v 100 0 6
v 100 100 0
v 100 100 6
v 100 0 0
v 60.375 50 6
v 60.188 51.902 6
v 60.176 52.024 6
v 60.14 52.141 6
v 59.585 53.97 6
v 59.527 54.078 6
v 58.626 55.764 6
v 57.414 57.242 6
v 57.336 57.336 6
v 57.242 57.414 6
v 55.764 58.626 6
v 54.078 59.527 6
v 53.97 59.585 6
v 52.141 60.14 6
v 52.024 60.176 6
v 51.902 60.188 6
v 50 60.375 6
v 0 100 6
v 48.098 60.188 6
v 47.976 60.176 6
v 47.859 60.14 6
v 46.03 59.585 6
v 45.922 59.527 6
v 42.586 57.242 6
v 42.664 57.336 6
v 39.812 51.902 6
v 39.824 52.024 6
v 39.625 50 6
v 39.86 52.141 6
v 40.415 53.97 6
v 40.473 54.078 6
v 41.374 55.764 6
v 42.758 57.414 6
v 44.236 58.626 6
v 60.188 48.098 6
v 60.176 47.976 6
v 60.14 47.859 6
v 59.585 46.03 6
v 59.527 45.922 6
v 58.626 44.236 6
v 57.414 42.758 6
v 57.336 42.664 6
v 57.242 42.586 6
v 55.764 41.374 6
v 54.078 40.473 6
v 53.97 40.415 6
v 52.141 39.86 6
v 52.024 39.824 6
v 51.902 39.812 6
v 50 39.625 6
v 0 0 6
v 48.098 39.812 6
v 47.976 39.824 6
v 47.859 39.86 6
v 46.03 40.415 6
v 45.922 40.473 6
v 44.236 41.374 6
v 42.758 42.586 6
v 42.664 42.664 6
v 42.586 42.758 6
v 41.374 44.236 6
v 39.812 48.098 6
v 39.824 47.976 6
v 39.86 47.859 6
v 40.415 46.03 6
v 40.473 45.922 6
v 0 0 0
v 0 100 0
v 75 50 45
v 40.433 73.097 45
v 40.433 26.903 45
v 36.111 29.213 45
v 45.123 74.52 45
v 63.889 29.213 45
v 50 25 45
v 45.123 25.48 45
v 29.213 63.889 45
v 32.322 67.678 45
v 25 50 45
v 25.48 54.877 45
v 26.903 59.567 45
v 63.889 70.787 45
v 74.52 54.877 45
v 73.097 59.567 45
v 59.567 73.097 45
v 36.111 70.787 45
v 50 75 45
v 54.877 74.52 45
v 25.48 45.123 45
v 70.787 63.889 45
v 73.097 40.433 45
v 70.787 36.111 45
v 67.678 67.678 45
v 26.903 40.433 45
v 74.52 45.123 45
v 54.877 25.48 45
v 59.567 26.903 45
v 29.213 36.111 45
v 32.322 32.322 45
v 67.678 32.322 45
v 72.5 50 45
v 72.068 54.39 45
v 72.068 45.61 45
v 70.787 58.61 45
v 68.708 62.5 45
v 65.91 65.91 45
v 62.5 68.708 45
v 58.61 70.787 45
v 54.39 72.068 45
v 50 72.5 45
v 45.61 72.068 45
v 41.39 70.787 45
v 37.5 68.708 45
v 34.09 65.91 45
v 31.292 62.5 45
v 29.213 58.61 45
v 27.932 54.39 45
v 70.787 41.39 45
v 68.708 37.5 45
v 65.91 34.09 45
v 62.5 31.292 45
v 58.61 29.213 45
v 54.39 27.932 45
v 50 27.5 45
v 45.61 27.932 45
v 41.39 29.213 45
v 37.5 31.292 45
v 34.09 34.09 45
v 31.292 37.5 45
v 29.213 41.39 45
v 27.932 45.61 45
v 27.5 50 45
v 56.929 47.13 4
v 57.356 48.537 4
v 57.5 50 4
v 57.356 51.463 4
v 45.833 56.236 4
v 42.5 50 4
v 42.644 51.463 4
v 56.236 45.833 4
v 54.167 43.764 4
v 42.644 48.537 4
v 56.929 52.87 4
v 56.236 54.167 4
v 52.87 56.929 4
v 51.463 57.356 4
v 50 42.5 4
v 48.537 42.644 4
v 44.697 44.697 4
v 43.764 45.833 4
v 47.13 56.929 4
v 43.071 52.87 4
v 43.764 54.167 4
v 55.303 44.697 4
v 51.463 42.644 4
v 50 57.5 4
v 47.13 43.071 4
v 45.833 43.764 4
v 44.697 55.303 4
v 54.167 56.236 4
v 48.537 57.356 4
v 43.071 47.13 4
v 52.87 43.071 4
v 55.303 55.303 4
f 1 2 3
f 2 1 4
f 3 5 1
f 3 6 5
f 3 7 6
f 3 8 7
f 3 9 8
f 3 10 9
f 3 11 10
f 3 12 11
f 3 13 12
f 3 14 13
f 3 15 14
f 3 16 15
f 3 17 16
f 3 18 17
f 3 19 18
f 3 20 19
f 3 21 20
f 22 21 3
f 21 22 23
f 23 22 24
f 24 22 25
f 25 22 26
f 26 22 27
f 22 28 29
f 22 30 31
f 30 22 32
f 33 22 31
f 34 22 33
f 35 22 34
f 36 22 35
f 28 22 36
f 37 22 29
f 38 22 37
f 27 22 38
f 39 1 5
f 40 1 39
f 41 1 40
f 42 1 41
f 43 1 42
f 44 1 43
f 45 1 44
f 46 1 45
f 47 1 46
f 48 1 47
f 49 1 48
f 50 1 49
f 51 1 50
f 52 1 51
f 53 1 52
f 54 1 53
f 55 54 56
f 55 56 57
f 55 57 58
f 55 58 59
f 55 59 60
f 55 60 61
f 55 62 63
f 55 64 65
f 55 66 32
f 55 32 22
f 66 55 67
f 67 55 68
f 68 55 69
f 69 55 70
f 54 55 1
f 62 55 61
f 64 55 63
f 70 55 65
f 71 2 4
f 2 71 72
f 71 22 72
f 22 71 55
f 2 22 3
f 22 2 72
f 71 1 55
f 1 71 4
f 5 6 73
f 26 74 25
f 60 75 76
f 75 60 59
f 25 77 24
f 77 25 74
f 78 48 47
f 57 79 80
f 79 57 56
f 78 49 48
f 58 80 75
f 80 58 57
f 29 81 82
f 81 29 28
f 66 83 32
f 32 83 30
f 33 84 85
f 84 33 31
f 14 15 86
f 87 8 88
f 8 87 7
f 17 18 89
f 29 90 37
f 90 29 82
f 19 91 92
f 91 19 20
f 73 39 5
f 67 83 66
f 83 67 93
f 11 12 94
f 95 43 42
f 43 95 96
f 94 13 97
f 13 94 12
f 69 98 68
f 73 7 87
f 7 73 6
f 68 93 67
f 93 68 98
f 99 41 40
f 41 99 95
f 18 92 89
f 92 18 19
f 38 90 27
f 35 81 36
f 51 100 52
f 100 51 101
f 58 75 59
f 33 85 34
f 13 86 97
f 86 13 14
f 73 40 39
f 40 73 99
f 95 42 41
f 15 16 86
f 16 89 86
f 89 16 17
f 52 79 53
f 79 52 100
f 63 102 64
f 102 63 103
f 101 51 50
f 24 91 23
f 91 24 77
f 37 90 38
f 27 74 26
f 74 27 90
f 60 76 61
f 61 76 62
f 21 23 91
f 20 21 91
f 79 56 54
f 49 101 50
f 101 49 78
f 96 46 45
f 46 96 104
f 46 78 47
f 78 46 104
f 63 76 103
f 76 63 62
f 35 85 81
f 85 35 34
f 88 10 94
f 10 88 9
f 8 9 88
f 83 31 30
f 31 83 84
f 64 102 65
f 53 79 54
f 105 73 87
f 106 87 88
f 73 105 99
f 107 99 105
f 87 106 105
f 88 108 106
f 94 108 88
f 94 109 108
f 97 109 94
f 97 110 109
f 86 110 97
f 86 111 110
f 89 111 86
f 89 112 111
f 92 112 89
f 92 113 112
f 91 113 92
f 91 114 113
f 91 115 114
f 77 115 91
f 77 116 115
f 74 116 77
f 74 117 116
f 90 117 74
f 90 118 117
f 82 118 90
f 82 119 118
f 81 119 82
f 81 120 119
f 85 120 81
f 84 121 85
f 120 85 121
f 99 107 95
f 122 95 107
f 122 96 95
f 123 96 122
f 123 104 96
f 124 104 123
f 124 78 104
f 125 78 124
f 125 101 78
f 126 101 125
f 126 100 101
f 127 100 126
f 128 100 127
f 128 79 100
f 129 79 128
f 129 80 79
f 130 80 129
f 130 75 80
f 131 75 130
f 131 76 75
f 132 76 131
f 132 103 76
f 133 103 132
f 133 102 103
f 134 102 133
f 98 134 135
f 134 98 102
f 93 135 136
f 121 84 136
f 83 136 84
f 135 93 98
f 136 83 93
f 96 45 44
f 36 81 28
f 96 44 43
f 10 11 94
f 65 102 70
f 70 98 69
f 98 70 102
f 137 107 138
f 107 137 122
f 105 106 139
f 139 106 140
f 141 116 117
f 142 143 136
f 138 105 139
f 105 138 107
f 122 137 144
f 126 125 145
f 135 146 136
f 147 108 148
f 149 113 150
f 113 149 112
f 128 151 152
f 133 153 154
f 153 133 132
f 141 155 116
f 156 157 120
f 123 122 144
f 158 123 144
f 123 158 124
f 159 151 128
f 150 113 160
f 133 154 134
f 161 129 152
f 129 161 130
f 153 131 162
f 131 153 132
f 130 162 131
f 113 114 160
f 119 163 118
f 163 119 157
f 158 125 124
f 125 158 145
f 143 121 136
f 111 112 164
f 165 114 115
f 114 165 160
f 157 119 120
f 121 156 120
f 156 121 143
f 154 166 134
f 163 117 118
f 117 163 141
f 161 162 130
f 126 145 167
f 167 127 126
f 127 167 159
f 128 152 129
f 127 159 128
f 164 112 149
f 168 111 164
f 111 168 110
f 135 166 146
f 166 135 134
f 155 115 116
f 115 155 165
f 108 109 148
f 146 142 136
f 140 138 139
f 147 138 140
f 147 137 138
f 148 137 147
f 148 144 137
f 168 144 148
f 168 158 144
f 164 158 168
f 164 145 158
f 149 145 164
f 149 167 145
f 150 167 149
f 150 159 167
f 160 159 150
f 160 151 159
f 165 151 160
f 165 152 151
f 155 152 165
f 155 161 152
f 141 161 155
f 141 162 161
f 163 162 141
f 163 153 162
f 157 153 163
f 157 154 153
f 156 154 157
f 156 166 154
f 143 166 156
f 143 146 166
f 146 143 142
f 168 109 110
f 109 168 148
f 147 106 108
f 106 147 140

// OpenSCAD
$fn = 32;

// ----------------------------------------------------------------------
// Hopper: funnel with square flange
// ----------------------------------------------------------------------

// --- parameters (mm) ---
fl = 100;                 // flange side, X and Y
fl_t = 6;                 // flange thickness
cone_h = 40;              // cone height above the flange
top_d = 50;               // cone mouth diameter
bot_d = 20;               // cone spout diameter
wall = 2.5;               // cone wall thickness

bore_d = bot_d - 2 * wall;  // spout bore diameter
total_h = fl_t + cone_h - 1;  // overall height

difference() {
  union() {
    cube([fl, fl, fl_t]);
    translate([fl / 2, fl / 2, fl_t - 1])
      cylinder(h = cone_h, d1 = bot_d, d2 = top_d);
  }
  translate([fl / 2, fl / 2, fl_t - 2])
    cylinder(h = cone_h + 1, d1 = bore_d, d2 = top_d - 2 * wall);
}
